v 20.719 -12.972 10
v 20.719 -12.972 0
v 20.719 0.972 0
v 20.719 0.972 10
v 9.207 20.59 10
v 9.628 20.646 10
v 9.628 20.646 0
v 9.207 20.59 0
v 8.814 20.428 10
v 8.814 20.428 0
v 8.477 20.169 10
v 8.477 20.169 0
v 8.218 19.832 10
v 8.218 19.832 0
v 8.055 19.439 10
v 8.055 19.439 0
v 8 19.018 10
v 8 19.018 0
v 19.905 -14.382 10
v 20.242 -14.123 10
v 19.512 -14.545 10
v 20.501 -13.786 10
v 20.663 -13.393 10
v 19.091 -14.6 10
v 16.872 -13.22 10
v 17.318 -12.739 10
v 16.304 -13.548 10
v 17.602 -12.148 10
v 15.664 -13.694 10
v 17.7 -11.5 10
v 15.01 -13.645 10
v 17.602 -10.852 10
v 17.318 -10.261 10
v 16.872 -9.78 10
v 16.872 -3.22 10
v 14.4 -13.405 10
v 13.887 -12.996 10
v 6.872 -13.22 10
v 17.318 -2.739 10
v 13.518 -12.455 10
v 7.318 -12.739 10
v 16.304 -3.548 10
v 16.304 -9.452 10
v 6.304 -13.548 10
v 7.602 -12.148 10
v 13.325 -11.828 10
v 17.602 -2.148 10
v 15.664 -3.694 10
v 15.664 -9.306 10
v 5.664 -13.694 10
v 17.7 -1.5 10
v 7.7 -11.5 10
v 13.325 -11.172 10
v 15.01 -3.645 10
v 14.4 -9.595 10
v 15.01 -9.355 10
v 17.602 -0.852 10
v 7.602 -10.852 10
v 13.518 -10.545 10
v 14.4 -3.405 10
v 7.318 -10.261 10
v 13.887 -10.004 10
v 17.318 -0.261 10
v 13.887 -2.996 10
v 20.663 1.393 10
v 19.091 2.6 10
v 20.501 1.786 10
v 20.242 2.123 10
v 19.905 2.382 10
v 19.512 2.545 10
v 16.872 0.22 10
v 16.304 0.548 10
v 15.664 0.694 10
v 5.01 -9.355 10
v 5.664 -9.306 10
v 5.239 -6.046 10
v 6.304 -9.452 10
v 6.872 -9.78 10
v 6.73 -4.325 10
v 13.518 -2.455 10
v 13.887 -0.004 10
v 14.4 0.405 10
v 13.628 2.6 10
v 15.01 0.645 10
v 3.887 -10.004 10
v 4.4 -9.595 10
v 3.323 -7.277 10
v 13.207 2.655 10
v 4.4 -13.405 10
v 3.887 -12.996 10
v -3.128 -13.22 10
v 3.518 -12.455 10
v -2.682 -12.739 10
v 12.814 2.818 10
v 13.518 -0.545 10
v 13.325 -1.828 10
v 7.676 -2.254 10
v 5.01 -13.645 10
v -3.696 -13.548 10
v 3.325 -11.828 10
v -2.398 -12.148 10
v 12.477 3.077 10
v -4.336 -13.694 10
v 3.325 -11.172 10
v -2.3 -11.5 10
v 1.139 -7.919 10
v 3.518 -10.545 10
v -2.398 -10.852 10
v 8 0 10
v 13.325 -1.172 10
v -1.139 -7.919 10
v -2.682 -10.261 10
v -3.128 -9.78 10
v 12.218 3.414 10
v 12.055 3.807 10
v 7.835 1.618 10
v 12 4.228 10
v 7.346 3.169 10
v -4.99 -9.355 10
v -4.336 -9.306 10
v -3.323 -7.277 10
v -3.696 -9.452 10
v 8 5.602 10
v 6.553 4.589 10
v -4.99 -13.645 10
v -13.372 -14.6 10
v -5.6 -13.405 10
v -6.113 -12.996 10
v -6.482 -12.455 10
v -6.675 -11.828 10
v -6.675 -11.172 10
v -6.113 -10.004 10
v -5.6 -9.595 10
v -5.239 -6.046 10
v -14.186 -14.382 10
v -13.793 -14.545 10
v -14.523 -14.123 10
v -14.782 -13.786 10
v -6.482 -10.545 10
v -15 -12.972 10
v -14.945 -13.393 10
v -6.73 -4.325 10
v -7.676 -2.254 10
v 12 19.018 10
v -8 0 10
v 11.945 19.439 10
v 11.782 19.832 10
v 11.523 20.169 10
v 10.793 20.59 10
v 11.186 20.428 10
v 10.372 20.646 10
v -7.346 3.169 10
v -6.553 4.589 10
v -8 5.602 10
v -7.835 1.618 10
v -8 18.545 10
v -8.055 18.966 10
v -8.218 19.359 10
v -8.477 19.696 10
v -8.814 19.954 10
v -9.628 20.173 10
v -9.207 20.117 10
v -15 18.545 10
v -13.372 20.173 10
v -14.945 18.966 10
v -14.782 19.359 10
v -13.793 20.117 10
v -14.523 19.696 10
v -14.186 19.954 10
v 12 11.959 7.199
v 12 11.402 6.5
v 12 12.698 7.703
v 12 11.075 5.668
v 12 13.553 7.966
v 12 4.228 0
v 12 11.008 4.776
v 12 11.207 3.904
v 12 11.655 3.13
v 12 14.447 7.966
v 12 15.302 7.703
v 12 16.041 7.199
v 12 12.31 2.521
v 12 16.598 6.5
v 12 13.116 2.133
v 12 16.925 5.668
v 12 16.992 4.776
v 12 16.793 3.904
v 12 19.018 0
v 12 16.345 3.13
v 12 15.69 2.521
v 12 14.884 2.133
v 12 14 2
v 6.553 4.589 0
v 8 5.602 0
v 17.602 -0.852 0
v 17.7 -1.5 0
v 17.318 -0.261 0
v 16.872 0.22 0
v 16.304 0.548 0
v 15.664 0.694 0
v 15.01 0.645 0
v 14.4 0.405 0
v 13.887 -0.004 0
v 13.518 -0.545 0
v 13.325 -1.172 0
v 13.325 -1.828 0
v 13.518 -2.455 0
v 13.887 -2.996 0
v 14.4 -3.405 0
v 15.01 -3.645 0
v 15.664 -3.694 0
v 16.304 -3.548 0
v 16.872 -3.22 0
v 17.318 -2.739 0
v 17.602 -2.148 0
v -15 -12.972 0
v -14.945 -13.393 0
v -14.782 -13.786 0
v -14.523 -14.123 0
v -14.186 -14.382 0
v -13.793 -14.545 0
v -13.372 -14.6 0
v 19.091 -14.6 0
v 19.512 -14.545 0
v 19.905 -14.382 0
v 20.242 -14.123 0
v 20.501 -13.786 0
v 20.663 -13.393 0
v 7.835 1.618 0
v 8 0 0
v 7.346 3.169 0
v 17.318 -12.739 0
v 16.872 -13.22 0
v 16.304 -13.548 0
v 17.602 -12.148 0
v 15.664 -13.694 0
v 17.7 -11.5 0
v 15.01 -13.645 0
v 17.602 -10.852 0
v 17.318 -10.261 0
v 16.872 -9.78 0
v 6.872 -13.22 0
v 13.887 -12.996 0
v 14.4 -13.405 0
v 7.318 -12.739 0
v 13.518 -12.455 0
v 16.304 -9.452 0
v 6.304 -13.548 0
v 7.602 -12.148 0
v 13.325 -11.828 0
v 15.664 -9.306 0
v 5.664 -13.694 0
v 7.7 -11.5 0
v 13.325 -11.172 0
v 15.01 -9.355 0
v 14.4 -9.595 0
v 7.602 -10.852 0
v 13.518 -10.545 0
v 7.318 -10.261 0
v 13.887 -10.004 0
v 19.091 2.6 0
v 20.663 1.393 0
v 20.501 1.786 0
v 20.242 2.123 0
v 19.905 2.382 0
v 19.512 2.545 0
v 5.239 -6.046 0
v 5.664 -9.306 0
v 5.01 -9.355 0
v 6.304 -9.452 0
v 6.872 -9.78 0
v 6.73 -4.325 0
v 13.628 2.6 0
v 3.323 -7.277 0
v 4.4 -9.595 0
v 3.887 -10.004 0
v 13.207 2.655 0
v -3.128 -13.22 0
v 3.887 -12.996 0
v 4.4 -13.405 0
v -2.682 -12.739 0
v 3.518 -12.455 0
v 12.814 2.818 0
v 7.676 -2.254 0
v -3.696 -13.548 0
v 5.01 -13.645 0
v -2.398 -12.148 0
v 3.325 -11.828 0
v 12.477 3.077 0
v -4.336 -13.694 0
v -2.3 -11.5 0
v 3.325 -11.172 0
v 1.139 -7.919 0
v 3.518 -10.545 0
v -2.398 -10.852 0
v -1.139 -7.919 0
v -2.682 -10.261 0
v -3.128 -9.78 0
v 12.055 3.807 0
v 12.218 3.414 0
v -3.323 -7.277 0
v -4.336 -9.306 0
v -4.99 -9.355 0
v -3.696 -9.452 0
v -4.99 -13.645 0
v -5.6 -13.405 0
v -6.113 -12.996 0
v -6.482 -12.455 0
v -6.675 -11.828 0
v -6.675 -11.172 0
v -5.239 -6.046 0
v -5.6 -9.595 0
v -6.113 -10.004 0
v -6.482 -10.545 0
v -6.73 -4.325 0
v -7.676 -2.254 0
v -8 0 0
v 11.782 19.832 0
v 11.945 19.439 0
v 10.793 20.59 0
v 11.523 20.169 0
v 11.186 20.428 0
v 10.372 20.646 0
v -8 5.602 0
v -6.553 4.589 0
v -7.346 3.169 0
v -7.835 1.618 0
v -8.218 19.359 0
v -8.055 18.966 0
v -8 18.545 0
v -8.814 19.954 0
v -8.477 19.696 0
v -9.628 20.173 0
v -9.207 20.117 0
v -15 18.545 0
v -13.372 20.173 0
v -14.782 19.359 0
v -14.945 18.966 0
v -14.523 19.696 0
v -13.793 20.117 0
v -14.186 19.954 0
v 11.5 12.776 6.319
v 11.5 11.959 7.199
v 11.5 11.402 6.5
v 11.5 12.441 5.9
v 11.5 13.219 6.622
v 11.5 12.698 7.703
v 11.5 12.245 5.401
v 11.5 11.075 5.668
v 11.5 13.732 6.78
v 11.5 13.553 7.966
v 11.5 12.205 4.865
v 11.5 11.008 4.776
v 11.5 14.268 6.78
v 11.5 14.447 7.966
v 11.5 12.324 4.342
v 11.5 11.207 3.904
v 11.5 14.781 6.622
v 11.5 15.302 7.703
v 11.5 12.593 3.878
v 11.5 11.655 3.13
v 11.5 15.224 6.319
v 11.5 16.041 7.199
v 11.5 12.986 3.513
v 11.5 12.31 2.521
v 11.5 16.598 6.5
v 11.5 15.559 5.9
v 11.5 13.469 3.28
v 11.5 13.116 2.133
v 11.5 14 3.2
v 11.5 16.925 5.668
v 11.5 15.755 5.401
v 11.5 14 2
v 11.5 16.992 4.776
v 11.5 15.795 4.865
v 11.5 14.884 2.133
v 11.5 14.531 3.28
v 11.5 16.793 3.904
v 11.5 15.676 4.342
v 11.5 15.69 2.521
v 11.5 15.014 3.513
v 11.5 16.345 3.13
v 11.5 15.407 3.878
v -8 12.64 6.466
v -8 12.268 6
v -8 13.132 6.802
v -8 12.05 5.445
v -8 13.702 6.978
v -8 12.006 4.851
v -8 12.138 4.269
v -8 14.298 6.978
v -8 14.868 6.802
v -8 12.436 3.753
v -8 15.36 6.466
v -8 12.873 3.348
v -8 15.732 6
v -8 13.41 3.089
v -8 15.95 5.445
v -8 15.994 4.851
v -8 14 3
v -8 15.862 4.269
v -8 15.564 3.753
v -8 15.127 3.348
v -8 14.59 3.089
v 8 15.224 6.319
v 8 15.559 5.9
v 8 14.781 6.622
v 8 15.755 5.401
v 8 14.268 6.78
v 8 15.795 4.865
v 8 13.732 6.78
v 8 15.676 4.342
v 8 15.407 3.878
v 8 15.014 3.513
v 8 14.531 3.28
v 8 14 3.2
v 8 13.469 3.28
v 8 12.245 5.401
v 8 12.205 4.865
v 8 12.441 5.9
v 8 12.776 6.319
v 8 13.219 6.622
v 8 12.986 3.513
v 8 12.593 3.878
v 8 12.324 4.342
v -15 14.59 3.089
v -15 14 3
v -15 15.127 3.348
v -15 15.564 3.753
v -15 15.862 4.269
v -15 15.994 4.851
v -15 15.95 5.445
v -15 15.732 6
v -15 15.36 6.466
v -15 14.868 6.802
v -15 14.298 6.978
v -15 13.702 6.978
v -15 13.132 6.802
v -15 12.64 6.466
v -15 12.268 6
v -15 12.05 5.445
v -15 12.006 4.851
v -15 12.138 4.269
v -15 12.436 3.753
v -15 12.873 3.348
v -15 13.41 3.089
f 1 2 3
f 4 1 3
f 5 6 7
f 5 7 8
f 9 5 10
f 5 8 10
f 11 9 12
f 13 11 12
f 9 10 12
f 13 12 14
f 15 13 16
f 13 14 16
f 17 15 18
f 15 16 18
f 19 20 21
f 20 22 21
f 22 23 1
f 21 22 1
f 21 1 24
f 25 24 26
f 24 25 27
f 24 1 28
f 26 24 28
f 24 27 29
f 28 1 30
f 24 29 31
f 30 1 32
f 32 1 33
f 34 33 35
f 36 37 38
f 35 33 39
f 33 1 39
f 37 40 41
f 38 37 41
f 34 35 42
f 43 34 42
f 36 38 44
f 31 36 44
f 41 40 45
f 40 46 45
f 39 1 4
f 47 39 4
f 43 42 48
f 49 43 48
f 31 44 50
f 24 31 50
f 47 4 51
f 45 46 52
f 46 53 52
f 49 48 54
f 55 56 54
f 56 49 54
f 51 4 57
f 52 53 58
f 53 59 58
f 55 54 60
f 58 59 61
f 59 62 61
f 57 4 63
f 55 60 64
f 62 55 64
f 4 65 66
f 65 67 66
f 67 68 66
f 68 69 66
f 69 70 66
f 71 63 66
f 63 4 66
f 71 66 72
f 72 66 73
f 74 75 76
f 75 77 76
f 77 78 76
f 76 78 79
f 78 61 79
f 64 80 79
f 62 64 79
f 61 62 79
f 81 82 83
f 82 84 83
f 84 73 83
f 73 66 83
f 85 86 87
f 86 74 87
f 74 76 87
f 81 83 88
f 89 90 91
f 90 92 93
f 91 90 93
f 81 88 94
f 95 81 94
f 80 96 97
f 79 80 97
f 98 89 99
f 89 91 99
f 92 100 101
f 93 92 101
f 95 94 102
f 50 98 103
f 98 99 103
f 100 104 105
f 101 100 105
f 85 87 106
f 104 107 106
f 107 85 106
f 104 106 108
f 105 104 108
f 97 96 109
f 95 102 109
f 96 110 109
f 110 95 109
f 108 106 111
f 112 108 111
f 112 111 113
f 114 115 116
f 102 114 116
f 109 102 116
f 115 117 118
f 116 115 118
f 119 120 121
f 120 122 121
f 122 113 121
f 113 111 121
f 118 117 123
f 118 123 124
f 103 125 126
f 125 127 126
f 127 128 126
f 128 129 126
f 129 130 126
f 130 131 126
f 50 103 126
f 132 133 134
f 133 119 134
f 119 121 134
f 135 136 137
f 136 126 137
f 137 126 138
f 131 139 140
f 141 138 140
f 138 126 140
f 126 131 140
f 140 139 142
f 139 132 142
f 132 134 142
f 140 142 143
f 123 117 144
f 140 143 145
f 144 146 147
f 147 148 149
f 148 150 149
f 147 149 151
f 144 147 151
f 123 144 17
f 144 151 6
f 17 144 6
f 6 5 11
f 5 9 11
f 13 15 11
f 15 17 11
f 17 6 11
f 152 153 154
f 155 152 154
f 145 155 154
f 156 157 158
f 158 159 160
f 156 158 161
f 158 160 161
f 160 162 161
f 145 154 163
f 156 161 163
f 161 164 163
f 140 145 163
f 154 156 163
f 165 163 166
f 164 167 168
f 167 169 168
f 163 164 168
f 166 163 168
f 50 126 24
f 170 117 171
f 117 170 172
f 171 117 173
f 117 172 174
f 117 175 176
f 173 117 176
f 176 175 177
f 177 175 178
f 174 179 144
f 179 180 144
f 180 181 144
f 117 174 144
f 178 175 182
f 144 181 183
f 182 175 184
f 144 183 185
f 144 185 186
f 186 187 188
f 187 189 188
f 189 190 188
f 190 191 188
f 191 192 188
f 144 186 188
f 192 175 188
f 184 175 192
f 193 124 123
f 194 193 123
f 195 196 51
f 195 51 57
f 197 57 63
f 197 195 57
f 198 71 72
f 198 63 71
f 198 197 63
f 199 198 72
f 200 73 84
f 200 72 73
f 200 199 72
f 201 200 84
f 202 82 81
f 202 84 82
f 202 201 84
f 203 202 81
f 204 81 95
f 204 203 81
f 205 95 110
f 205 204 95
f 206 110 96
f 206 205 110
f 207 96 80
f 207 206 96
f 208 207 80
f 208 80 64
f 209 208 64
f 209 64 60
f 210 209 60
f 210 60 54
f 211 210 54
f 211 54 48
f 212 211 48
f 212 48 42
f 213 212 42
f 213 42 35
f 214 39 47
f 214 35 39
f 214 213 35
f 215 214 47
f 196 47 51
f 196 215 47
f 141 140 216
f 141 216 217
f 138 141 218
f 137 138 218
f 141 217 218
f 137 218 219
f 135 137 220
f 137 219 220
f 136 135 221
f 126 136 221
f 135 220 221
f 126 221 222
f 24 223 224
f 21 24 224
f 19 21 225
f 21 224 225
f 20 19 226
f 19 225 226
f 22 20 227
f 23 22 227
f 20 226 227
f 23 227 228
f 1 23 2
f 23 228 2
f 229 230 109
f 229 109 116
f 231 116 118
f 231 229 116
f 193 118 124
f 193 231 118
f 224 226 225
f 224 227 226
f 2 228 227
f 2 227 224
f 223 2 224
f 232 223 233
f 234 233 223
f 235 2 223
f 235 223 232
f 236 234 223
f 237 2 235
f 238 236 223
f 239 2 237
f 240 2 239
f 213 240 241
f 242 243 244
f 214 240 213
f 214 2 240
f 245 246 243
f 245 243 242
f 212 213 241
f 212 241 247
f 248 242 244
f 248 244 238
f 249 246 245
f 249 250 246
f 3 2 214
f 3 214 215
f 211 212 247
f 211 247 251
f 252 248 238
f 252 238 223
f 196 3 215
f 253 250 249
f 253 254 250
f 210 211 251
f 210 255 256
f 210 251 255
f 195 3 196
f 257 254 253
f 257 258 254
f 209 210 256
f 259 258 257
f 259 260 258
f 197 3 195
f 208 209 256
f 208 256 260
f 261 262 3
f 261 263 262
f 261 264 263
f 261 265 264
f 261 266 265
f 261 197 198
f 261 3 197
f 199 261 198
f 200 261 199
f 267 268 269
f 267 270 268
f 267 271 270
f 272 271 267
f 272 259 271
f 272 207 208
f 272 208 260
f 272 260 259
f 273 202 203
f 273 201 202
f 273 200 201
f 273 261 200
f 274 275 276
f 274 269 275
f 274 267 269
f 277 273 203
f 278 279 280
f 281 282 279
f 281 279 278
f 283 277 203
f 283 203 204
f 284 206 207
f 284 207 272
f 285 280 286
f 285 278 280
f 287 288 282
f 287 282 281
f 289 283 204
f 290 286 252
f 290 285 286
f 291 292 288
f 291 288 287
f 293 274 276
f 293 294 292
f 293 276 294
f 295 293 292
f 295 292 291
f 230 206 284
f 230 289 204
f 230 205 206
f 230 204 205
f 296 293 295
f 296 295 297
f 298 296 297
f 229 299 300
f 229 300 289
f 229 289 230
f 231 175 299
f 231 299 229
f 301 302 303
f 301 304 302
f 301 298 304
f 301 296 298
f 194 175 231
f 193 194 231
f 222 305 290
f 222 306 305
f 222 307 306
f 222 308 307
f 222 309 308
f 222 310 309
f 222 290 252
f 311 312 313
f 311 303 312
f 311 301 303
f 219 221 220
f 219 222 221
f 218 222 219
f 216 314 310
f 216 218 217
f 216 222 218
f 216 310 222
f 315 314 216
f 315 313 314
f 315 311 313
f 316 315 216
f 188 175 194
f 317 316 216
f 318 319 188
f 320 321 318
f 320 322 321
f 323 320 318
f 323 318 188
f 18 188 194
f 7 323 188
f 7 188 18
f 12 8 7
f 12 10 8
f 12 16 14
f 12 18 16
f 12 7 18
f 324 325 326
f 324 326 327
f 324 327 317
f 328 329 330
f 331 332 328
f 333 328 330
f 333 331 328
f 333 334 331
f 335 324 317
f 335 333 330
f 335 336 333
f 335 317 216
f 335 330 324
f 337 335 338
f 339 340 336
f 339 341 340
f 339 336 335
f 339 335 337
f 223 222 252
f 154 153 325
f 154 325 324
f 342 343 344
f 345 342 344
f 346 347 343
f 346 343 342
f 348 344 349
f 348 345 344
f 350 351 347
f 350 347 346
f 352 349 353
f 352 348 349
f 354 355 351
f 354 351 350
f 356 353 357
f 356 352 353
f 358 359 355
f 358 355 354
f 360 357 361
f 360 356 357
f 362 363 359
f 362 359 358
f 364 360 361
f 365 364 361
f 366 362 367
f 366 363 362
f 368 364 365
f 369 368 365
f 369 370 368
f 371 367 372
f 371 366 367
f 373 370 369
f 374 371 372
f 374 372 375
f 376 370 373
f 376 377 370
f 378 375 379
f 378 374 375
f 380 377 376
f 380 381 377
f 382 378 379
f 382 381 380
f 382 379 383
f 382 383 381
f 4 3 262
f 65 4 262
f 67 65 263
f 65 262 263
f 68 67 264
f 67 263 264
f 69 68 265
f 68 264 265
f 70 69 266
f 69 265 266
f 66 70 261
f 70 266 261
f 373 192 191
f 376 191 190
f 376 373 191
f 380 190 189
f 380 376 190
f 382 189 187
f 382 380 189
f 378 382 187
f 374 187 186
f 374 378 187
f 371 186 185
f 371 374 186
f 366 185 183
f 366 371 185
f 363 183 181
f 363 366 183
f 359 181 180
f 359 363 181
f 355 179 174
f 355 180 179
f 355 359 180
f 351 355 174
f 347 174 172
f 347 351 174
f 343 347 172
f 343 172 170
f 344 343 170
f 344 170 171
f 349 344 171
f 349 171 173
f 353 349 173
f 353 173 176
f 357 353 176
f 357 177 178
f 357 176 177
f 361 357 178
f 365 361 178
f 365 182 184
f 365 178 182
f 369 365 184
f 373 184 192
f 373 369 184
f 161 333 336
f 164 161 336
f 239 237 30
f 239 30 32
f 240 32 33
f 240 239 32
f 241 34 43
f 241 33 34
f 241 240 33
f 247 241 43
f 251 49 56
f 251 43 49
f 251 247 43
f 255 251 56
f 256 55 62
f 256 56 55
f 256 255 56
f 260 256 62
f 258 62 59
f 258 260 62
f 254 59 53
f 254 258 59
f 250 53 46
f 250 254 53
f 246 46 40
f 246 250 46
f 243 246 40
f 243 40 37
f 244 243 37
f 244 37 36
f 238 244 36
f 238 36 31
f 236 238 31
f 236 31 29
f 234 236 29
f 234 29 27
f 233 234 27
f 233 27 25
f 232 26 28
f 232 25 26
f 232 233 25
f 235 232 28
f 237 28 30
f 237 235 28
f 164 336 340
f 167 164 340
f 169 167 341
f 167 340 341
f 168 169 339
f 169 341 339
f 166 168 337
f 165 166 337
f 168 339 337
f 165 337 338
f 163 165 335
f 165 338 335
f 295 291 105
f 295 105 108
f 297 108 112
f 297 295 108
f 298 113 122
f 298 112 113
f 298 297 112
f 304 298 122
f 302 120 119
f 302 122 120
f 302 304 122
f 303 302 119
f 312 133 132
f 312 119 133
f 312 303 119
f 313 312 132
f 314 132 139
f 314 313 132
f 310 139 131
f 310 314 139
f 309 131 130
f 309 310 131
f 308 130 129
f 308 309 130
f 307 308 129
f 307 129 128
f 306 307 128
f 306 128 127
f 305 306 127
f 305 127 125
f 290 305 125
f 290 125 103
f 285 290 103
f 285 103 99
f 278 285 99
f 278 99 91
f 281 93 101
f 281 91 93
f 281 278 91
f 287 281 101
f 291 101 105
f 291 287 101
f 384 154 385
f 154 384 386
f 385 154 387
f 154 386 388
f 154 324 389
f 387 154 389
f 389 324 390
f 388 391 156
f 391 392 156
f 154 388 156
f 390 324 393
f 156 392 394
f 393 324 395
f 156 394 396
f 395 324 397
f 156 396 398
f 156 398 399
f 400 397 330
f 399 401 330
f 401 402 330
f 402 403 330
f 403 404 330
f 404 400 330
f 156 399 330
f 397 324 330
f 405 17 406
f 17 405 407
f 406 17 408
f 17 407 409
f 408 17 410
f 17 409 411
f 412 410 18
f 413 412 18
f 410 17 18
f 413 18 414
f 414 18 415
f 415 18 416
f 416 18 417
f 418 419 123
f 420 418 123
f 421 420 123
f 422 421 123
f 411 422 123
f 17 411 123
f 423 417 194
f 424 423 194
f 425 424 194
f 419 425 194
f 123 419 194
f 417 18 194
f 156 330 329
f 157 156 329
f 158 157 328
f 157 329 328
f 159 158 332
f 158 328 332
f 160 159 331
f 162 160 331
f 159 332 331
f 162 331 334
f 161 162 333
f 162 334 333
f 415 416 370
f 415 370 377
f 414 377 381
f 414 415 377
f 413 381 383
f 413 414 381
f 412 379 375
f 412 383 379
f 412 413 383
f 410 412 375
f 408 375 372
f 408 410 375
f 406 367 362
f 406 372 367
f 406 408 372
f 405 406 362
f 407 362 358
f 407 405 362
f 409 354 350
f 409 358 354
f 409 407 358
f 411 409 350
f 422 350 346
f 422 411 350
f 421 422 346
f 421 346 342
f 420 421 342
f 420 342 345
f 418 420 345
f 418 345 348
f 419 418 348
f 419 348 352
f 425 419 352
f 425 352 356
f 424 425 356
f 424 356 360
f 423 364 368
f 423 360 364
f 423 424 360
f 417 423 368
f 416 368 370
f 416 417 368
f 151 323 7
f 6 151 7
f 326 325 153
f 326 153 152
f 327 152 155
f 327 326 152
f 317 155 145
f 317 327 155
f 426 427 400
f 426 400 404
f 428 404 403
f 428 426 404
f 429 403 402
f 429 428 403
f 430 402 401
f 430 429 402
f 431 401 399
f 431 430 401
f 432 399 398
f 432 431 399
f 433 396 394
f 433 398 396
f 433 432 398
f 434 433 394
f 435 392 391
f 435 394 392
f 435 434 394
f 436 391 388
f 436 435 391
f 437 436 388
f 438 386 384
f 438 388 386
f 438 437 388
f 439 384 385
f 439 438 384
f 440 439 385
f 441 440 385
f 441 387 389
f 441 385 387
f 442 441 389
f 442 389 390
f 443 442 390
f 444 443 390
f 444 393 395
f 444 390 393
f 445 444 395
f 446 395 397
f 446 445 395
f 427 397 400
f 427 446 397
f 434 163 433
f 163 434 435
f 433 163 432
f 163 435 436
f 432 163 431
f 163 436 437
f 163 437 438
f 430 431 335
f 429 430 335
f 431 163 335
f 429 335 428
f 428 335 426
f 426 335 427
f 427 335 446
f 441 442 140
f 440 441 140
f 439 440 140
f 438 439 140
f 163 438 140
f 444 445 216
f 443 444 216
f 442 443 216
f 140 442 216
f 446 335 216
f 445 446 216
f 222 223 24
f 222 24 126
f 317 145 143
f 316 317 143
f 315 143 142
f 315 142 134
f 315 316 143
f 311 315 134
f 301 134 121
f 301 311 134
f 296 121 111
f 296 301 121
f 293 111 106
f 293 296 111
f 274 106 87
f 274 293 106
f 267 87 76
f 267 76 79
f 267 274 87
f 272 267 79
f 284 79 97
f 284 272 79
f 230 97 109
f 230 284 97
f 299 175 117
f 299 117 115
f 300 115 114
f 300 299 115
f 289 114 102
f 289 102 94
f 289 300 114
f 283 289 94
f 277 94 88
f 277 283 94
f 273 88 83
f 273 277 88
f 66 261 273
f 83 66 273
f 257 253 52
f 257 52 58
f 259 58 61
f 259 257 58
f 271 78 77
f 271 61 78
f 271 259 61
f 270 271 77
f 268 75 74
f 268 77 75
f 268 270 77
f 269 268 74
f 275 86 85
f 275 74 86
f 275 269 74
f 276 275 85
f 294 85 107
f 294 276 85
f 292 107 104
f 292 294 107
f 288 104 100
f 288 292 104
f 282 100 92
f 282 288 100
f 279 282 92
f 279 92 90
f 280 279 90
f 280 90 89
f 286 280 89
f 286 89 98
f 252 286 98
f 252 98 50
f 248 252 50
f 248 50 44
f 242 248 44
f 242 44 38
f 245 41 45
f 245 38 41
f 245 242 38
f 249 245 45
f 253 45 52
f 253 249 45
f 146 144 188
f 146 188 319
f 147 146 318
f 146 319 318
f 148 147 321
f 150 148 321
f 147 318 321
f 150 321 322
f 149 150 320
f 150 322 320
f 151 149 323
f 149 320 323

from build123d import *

# Parameters (mm, degrees)
CYLINDER011012_R               = 1.8
CYLINDER011012_DEPTH           = 20
CYLINDER011013_R               = 3
CYLINDER011013_DEPTH           = 20
CYLINDER011010_R               = 2.2
CYLINDER011010_DEPTH           = 100
ARRAY008_X_COUNT               = 3
ARRAY008_X_PITCH               = 10
ARRAY008_Y_COUNT               = 3
ARRAY008_Y_PITCH               = 10
CYLINDER011011_R               = 2
CYLINDER011011_DEPTH           = 20
CYLINDER011014_R               = 8
CYLINDER011014_DEPTH           = 10
CYLINDER011015_W               = 11
CYLINDER011015_H               = 10
CYLINDER011015_ANGLE           = 250
CYLINDER011015_PLACEMENT_ANGLE = 145
PAD_DEPTH                      = 10


with BuildPart() as bolt_hole001:
    # Cylinder011012 → Cylinder011012 (new body)
    with BuildSketch(Plane(origin=(-1, 14, 5), x_dir=(0, 0, -1), z_dir=(1, 0, 0))):
        Circle(CYLINDER011012_R)
    extrude(amount=CYLINDER011012_DEPTH)


with BuildPart() as bolt_head_hole:
    # Cylinder011013 → Cylinder011013 (new body)
    with BuildSketch(Plane(origin=(11.5, 14, 5), x_dir=(0, 0, -1), z_dir=(1, 0, 0))):
        Circle(CYLINDER011013_R)
    extrude(amount=CYLINDER011013_DEPTH)


with BuildPart() as general_insert_hole_array:
    # Cylinder011010 → Cylinder011010 (new body)
    with BuildSketch(Plane.XY):
        Circle(CYLINDER011010_R)
    extrude(amount=CYLINDER011010_DEPTH)

    # Array008 X: general insert hole array ×3


with BuildPart() as general_insert_hole_array_1:
    add(general_insert_hole_array.part)
    with Locations(*[(i * ARRAY008_X_PITCH, 0, 0) for i in range(1, ARRAY008_X_COUNT)]):
        add(general_insert_hole_array.part)

    # Array008 Y: general insert hole array ×3


with BuildPart() as general_insert_hole_array_2:
    add(general_insert_hole_array_1.part)
    with Locations(*[(0, i * ARRAY008_Y_PITCH, 0) for i in range(1, ARRAY008_Y_COUNT)]):
        add(general_insert_hole_array_1.part)


with BuildPart() as general_insert_hole_array_3:
    # Array008 placement: moved
    add(general_insert_hole_array_2.part.moved(Location((-4.5, -21.5, -13))))


with BuildPart() as shaft_attachment_holde_fusion:
    # Cylinder011011 → Cylinder011011 (new body)
    with BuildSketch(Plane(origin=(-22, 14, 5), x_dir=(0, 0, -1), z_dir=(1, 0, 0))):
        Circle(CYLINDER011011_R)
    extrude(amount=CYLINDER011011_DEPTH)

    # Fusion004: union bolt hole001, bolt head hole, general insert hole array
    add(bolt_hole001.part)
    add(bolt_head_hole.part)
    add(general_insert_hole_array_3.part)


with BuildPart() as cylinder:
    # Cylinder011014 → Cylinder011014 (new body)
    with BuildSketch(Plane.XY):
        Circle(CYLINDER011014_R)
    extrude(amount=CYLINDER011014_DEPTH)


with BuildPart() as cut023015009010:
    # Cylinder011015 → Cylinder011015 (revolve)
    with BuildSketch(Plane.XZ):
        with Locations((5.5, 5)):
            Rectangle(CYLINDER011015_W, CYLINDER011015_H)
    revolve(axis=Axis((0, 0, 0), (0, 0, 1)), revolution_arc=CYLINDER011015_ANGLE)


with BuildPart() as cut023015009010_1:
    # Cylinder011015 placement: moved
    add(cut023015009010.part.rotate(Axis((0, 0, 0), (0, 0, 1)), CYLINDER011015_PLACEMENT_ANGLE))

    # Cut023015009010: cut Cylinder
    add(cylinder.part, mode=Mode.SUBTRACT)


with BuildPart() as shaft_attachment_cut:
    # Sketch002 → Pad (new body)
    with BuildSketch(Plane.XY):
        with BuildLine():
            Line((19.091117, -14.6), (-13.372183, -14.6))
            ThreePointArc((-15, -12.972183), (-14.523223, -14.123223), (-13.372183, -14.6))
            Line((-15, 18.544728), (-15, -12.972183))
            ThreePointArc((-13.372183, 20.172545), (-14.523223, 19.695769), (-15, 18.544728))
            Line((-9.627817, 20.172545), (-13.372183, 20.172545))
            ThreePointArc((-8, 18.544728), (-8.476777, 19.695769), (-9.627817, 20.172545))
            Line((-8, 0), (-8, 18.544728))
            ThreePointArc((-8, 0), (0, -8), (8, 0))
            Line((8, 19.017869), (8, 0))
            ThreePointArc((9.627817, 20.645687), (8.476777, 20.16891), (8, 19.017869))
            Line((10.372183, 20.645687), (9.627817, 20.645687))
            ThreePointArc((12, 19.017869), (11.523223, 20.16891), (10.372183, 20.645687))
            Line((12, 4.227817), (12, 19.017869))
            ThreePointArc((12, 4.227817), (12.476777, 3.076777), (13.627817, 2.6))
            Line((19.091117, 2.6), (13.627817, 2.6))
            ThreePointArc((20.718934, 0.972183), (20.242157, 2.123223), (19.091117, 2.6))
            Line((20.718934, -12.972183), (20.718934, 0.972183))
            ThreePointArc((19.091117, -14.6), (20.242157, -14.123223), (20.718934, -12.972183))
        make_face()
    extrude(amount=PAD_DEPTH)

    # Fusion005: union Cut023015009010
    add(cut023015009010_1.part)

    # Cut023015009009: cut shaft attachment holde fusion
    add(shaft_attachment_holde_fusion.part, mode=Mode.SUBTRACT)


solid = shaft_attachment_cut.part
